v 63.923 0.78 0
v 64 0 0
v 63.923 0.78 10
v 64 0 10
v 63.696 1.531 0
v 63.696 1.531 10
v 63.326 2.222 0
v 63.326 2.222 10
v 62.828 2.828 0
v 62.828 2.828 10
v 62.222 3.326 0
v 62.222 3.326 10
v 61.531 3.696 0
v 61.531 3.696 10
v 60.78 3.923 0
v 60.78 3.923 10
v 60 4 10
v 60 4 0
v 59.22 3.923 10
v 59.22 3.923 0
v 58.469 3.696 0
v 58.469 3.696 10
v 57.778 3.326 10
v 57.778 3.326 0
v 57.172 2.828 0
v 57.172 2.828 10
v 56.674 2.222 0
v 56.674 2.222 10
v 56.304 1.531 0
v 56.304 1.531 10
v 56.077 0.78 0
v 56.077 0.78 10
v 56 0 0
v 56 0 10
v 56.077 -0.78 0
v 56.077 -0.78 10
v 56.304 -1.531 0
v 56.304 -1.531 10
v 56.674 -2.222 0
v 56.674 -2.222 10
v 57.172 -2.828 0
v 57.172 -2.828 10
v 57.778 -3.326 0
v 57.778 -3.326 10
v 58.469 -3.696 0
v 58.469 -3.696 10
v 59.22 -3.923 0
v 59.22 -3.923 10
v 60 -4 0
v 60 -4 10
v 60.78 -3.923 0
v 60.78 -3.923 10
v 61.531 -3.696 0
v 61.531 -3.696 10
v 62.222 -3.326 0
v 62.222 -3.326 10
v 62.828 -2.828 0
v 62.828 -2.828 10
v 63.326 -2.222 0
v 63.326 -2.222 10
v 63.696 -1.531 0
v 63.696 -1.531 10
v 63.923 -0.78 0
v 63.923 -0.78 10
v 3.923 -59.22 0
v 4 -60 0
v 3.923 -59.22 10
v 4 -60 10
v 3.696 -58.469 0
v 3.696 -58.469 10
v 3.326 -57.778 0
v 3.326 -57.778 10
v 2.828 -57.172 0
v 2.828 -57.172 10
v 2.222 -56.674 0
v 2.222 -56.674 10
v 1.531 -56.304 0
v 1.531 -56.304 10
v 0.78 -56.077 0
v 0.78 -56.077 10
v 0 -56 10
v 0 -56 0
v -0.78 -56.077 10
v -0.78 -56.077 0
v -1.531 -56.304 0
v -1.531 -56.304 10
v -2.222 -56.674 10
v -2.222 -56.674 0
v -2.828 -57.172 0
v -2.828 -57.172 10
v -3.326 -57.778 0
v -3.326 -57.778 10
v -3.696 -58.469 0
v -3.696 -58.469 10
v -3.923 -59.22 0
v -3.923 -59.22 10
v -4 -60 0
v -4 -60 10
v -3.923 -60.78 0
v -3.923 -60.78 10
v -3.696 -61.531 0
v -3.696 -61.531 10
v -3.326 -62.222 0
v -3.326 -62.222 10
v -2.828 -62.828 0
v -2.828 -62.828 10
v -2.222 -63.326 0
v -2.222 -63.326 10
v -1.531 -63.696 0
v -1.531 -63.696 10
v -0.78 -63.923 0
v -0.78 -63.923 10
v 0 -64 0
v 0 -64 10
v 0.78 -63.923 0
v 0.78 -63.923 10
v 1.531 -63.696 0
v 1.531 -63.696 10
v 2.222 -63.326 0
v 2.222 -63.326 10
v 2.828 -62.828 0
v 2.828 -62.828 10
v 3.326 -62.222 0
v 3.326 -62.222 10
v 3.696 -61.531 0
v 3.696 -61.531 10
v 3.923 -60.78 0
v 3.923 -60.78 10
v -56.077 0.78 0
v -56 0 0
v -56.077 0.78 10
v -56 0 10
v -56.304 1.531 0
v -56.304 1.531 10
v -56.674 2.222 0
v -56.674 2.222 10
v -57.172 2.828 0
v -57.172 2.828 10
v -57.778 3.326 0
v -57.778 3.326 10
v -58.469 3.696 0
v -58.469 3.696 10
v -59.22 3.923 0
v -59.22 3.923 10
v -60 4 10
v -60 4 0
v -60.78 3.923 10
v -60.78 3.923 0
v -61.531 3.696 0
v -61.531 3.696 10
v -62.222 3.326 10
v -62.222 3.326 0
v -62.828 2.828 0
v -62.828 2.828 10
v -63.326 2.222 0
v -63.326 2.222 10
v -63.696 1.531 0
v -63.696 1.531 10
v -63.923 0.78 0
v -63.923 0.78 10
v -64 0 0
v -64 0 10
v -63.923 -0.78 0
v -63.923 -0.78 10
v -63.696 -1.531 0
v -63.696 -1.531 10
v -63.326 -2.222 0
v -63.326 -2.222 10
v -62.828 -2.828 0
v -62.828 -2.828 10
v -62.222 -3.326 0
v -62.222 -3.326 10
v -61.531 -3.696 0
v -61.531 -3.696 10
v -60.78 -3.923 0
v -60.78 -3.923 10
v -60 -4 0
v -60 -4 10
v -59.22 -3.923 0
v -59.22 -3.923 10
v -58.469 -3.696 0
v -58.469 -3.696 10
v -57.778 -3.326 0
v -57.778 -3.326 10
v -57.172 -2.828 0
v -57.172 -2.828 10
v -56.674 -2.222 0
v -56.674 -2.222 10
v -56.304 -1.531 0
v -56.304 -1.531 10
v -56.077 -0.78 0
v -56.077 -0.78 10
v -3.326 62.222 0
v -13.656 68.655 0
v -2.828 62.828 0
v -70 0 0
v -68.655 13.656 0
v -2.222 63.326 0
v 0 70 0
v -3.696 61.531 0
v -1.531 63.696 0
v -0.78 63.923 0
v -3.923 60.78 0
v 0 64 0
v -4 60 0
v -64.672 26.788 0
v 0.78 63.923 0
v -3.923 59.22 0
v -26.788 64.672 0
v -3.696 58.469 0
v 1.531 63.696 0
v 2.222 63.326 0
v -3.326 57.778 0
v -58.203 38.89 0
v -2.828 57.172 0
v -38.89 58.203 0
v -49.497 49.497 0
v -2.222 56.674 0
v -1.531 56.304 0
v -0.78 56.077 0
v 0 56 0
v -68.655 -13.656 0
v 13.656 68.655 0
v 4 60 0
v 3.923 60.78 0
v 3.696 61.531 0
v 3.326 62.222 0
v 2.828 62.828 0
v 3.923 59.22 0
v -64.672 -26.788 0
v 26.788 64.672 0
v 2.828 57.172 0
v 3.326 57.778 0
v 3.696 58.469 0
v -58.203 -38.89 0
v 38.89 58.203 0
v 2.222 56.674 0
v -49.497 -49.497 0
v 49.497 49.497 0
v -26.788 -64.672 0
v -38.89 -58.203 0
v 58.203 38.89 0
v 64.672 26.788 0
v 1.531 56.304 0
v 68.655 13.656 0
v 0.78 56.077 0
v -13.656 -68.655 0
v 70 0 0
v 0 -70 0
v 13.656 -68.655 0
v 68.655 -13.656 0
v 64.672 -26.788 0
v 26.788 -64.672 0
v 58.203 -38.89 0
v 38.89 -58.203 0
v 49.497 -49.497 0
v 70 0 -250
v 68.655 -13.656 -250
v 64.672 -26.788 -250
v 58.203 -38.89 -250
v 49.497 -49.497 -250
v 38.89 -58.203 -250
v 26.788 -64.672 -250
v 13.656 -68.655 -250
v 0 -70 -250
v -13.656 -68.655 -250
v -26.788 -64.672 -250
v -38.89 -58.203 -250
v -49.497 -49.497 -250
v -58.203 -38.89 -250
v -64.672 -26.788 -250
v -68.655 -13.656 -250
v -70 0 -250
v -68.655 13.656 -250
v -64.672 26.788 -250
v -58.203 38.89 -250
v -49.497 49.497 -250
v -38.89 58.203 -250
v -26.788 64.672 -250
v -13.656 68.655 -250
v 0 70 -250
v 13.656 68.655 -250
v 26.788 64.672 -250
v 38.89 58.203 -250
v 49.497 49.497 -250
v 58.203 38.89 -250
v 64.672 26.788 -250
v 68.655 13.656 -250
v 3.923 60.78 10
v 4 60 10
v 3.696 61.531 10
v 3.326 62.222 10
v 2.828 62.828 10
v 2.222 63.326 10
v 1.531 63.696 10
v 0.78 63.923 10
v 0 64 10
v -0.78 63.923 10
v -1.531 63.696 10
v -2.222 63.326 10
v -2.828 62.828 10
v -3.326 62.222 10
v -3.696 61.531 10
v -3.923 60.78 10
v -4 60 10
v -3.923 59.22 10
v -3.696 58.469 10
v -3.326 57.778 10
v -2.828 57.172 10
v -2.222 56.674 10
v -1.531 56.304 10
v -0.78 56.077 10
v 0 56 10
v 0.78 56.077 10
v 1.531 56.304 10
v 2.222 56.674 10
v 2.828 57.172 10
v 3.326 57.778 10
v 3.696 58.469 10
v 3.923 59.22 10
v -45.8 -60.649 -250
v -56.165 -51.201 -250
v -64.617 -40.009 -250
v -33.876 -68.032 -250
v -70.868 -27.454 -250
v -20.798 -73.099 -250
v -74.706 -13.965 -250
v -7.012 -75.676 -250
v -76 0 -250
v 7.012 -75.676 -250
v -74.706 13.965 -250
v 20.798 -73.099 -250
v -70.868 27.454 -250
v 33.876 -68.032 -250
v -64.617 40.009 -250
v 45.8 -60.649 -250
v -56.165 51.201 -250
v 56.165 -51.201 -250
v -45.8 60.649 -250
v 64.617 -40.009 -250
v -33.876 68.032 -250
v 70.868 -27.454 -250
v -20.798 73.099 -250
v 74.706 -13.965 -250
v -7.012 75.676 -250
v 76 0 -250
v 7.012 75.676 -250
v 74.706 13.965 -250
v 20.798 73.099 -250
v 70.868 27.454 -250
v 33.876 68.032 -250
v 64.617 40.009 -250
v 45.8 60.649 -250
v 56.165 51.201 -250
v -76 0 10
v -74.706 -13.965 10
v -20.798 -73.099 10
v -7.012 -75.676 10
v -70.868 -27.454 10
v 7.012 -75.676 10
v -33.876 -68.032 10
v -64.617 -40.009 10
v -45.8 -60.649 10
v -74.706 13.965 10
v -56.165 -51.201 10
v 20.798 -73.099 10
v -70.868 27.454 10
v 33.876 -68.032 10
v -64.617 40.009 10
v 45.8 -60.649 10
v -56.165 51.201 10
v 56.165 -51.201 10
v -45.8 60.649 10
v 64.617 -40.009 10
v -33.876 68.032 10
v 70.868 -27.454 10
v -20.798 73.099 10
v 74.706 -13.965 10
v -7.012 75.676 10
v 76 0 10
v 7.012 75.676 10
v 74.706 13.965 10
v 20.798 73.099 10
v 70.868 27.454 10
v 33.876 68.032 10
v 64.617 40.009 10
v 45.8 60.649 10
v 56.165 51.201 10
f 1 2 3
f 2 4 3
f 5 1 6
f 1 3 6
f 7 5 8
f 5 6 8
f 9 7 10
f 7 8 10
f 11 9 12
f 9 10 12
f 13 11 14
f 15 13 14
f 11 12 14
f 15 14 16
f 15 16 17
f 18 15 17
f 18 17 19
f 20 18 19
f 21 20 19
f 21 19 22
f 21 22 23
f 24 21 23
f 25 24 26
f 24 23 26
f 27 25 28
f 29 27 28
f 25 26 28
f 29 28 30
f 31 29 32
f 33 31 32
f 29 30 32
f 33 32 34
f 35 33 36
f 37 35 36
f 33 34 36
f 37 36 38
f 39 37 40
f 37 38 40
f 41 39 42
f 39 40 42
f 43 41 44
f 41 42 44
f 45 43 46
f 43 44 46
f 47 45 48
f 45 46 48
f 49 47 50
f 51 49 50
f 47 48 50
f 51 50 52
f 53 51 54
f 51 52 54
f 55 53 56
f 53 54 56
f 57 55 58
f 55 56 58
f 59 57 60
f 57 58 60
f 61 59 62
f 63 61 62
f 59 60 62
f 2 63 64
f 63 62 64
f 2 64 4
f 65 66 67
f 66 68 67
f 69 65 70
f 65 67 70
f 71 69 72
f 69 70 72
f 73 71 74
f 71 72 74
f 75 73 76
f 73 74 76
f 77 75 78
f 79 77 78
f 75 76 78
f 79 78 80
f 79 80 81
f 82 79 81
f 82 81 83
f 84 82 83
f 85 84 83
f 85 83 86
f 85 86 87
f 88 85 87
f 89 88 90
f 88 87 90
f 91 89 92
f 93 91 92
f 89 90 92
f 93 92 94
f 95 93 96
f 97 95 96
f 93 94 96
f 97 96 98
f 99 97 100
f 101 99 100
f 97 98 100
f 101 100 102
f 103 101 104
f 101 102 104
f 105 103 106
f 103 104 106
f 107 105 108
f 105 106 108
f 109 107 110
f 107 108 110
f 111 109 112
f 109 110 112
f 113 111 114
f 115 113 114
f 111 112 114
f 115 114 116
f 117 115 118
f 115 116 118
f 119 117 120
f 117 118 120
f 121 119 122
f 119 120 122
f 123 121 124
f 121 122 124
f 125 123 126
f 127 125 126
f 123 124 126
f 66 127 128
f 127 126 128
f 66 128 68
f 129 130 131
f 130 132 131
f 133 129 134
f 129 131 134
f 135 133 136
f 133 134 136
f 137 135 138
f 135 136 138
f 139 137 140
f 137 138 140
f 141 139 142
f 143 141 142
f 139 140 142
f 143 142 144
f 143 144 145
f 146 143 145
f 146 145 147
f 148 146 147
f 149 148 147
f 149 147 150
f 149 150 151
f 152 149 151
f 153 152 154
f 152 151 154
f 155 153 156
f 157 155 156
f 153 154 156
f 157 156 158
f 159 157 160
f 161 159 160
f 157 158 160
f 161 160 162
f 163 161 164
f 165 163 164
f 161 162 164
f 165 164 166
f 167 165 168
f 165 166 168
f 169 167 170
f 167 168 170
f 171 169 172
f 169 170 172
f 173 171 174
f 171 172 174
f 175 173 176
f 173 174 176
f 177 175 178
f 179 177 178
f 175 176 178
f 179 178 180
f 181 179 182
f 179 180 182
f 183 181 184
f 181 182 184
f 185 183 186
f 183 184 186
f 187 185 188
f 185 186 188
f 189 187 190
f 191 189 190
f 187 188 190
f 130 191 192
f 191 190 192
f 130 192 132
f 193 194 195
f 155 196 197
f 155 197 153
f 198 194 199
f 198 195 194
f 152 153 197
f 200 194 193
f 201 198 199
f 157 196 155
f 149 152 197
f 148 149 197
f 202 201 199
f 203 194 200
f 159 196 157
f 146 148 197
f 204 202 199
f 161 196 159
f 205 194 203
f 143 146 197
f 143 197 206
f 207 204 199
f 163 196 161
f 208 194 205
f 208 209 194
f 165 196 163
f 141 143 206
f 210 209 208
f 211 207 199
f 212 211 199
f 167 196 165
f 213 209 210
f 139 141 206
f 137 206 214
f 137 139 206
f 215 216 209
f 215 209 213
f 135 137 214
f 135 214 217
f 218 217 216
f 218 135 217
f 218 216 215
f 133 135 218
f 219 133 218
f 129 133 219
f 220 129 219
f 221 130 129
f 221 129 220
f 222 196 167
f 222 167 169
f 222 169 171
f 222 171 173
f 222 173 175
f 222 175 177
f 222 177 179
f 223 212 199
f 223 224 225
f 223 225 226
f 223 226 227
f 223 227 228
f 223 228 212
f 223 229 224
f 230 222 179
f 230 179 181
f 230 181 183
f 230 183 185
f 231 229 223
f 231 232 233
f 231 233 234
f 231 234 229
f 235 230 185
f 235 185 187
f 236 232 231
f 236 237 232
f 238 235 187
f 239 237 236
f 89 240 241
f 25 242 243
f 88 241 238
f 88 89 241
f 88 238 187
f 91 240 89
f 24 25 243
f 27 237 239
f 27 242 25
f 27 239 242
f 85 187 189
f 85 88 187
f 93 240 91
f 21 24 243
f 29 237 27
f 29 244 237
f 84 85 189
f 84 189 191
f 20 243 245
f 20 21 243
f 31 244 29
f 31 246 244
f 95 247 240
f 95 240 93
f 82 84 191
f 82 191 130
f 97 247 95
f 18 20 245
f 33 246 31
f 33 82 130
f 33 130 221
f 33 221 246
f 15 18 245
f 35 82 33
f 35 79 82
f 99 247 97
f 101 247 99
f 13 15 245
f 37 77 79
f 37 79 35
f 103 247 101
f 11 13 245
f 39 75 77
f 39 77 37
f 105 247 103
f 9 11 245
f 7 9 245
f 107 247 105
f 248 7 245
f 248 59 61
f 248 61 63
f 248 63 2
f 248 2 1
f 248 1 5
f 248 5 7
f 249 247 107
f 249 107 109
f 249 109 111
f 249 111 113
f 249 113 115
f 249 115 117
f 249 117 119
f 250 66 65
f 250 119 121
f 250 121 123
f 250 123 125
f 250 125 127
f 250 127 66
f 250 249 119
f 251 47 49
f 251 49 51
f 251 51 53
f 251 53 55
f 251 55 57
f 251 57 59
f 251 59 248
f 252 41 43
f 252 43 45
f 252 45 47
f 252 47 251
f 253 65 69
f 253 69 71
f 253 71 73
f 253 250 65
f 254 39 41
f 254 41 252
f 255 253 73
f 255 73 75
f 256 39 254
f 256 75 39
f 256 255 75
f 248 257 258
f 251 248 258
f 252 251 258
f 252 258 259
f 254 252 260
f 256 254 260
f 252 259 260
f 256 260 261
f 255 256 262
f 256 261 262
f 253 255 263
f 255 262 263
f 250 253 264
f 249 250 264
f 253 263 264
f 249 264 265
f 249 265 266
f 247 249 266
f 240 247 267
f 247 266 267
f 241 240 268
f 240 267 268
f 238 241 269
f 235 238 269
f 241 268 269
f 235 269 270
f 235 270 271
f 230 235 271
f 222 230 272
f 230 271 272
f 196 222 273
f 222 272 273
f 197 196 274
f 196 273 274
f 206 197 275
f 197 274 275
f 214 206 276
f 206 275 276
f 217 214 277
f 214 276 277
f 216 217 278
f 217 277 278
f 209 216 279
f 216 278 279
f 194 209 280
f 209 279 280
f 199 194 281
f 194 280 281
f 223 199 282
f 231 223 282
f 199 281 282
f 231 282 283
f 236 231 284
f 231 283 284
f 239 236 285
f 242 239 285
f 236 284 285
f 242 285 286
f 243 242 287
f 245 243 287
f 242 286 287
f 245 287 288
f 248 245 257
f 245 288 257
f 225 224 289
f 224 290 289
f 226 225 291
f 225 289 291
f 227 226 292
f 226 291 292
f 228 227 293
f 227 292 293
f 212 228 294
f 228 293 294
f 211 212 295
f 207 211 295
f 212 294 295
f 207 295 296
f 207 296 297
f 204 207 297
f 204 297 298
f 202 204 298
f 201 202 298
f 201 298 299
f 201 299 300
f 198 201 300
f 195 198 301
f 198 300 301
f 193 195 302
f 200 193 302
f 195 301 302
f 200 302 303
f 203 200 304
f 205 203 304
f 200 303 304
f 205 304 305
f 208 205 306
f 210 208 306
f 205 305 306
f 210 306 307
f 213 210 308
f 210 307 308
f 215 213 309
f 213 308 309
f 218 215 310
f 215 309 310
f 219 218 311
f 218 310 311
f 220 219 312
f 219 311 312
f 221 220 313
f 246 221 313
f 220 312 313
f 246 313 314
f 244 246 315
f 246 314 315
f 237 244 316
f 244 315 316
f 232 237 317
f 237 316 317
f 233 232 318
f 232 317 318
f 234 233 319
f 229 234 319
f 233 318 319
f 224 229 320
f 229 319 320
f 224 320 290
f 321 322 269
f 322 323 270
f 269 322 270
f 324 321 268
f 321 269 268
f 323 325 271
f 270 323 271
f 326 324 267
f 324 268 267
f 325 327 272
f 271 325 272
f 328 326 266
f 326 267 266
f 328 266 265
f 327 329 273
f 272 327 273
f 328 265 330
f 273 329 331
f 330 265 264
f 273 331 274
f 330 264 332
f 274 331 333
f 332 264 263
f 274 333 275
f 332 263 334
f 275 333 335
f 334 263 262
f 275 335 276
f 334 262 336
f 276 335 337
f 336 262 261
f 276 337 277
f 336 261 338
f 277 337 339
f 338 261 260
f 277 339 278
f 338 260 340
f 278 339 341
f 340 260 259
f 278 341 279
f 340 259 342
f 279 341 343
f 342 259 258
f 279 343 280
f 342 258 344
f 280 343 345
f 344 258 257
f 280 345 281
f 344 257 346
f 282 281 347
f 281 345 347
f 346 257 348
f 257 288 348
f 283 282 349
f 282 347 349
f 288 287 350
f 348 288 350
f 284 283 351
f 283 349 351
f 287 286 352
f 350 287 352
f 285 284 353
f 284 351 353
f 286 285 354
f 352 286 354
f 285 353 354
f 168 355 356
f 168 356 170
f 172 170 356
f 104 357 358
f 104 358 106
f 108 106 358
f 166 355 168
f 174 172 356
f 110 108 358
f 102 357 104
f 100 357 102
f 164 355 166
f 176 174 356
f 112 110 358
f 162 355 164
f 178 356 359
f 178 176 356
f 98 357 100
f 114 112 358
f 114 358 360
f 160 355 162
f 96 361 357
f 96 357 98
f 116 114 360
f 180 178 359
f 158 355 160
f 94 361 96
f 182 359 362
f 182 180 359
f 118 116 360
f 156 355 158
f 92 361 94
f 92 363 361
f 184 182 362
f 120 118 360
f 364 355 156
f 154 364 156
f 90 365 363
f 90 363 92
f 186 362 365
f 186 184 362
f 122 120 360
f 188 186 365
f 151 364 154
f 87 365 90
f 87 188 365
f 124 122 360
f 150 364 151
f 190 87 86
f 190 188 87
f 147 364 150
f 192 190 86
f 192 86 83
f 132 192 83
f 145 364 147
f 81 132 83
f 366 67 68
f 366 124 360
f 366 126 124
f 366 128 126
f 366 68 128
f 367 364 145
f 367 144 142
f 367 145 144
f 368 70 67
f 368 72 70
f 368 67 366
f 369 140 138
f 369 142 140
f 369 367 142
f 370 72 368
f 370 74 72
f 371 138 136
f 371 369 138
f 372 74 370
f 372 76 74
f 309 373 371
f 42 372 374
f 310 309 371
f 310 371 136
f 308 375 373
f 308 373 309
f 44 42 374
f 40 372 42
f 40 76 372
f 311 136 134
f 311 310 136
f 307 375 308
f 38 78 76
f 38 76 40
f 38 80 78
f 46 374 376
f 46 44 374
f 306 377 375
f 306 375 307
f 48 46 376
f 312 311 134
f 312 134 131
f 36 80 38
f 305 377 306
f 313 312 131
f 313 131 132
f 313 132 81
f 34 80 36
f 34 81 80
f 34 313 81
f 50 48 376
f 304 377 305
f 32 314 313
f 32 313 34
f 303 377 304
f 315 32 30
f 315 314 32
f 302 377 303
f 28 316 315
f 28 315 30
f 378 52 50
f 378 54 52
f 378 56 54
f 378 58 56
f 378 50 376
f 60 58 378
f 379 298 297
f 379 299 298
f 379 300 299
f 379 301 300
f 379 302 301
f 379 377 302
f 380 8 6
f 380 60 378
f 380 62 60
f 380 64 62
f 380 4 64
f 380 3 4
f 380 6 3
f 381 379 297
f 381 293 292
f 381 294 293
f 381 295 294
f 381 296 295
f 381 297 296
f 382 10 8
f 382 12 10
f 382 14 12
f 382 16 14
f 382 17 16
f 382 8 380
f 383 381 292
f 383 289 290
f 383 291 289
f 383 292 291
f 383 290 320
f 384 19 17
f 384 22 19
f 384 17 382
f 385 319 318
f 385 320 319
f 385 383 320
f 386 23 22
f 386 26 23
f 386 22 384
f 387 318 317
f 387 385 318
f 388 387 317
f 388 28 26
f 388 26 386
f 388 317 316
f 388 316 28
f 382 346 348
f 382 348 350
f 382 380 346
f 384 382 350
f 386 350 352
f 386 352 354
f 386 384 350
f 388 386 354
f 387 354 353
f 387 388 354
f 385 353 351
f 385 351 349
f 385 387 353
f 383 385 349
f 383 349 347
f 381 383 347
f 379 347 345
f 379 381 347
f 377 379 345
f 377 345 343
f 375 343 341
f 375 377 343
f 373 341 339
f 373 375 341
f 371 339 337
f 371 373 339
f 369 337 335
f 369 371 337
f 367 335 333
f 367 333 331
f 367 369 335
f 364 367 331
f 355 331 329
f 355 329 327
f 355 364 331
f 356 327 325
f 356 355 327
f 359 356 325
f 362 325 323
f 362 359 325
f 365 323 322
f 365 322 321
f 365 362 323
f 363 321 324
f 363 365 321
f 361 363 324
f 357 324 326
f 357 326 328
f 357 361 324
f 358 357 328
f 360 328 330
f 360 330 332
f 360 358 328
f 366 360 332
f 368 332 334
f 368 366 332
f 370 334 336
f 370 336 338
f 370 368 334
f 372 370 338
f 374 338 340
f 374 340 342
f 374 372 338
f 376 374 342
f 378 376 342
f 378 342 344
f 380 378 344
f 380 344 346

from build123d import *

# Parameters (mm, degrees)
F0_R     = 76
F1_DEPTH = 10
F2_R     = 4
F3_DEPTH = 10
F4_DEPTH = 250
F5_R     = 70
F6_DEPTH = 250


with BuildPart() as f1:
    # F0 (on Top) → F1 (new body)
    with BuildSketch(Plane.XY):
        Circle(F0_R)
    extrude(amount=F1_DEPTH)

    # F2 (on face) → F3 (cut, through all)
    with BuildSketch(Plane.XY.offset(10)):
        with Locations((-60, 0)):
            Circle(F2_R)
        with Locations((60, 0)):
            Circle(F2_R)
        with Locations((0, -60)):
            Circle(F2_R)
        with Locations((0, 60)):
            Circle(F2_R)
    extrude(amount=-F3_DEPTH, mode=Mode.SUBTRACT)

    # F4 (add): a face of the model
    f4_faces = [f1.faces().sort_by_distance(p)[0] for p in [
        (0, 0, 0),
    ]]
    extrude(f4_faces, amount=F4_DEPTH)

    # F5 (on face) → F6 (cut, through all)
    with BuildSketch(Plane(origin=(0, 0, -250), x_dir=(1, 0, 0), z_dir=(0, 0, -1))):
        Circle(F5_R)
    extrude(amount=-F6_DEPTH, mode=Mode.SUBTRACT)


solid = f1.part
